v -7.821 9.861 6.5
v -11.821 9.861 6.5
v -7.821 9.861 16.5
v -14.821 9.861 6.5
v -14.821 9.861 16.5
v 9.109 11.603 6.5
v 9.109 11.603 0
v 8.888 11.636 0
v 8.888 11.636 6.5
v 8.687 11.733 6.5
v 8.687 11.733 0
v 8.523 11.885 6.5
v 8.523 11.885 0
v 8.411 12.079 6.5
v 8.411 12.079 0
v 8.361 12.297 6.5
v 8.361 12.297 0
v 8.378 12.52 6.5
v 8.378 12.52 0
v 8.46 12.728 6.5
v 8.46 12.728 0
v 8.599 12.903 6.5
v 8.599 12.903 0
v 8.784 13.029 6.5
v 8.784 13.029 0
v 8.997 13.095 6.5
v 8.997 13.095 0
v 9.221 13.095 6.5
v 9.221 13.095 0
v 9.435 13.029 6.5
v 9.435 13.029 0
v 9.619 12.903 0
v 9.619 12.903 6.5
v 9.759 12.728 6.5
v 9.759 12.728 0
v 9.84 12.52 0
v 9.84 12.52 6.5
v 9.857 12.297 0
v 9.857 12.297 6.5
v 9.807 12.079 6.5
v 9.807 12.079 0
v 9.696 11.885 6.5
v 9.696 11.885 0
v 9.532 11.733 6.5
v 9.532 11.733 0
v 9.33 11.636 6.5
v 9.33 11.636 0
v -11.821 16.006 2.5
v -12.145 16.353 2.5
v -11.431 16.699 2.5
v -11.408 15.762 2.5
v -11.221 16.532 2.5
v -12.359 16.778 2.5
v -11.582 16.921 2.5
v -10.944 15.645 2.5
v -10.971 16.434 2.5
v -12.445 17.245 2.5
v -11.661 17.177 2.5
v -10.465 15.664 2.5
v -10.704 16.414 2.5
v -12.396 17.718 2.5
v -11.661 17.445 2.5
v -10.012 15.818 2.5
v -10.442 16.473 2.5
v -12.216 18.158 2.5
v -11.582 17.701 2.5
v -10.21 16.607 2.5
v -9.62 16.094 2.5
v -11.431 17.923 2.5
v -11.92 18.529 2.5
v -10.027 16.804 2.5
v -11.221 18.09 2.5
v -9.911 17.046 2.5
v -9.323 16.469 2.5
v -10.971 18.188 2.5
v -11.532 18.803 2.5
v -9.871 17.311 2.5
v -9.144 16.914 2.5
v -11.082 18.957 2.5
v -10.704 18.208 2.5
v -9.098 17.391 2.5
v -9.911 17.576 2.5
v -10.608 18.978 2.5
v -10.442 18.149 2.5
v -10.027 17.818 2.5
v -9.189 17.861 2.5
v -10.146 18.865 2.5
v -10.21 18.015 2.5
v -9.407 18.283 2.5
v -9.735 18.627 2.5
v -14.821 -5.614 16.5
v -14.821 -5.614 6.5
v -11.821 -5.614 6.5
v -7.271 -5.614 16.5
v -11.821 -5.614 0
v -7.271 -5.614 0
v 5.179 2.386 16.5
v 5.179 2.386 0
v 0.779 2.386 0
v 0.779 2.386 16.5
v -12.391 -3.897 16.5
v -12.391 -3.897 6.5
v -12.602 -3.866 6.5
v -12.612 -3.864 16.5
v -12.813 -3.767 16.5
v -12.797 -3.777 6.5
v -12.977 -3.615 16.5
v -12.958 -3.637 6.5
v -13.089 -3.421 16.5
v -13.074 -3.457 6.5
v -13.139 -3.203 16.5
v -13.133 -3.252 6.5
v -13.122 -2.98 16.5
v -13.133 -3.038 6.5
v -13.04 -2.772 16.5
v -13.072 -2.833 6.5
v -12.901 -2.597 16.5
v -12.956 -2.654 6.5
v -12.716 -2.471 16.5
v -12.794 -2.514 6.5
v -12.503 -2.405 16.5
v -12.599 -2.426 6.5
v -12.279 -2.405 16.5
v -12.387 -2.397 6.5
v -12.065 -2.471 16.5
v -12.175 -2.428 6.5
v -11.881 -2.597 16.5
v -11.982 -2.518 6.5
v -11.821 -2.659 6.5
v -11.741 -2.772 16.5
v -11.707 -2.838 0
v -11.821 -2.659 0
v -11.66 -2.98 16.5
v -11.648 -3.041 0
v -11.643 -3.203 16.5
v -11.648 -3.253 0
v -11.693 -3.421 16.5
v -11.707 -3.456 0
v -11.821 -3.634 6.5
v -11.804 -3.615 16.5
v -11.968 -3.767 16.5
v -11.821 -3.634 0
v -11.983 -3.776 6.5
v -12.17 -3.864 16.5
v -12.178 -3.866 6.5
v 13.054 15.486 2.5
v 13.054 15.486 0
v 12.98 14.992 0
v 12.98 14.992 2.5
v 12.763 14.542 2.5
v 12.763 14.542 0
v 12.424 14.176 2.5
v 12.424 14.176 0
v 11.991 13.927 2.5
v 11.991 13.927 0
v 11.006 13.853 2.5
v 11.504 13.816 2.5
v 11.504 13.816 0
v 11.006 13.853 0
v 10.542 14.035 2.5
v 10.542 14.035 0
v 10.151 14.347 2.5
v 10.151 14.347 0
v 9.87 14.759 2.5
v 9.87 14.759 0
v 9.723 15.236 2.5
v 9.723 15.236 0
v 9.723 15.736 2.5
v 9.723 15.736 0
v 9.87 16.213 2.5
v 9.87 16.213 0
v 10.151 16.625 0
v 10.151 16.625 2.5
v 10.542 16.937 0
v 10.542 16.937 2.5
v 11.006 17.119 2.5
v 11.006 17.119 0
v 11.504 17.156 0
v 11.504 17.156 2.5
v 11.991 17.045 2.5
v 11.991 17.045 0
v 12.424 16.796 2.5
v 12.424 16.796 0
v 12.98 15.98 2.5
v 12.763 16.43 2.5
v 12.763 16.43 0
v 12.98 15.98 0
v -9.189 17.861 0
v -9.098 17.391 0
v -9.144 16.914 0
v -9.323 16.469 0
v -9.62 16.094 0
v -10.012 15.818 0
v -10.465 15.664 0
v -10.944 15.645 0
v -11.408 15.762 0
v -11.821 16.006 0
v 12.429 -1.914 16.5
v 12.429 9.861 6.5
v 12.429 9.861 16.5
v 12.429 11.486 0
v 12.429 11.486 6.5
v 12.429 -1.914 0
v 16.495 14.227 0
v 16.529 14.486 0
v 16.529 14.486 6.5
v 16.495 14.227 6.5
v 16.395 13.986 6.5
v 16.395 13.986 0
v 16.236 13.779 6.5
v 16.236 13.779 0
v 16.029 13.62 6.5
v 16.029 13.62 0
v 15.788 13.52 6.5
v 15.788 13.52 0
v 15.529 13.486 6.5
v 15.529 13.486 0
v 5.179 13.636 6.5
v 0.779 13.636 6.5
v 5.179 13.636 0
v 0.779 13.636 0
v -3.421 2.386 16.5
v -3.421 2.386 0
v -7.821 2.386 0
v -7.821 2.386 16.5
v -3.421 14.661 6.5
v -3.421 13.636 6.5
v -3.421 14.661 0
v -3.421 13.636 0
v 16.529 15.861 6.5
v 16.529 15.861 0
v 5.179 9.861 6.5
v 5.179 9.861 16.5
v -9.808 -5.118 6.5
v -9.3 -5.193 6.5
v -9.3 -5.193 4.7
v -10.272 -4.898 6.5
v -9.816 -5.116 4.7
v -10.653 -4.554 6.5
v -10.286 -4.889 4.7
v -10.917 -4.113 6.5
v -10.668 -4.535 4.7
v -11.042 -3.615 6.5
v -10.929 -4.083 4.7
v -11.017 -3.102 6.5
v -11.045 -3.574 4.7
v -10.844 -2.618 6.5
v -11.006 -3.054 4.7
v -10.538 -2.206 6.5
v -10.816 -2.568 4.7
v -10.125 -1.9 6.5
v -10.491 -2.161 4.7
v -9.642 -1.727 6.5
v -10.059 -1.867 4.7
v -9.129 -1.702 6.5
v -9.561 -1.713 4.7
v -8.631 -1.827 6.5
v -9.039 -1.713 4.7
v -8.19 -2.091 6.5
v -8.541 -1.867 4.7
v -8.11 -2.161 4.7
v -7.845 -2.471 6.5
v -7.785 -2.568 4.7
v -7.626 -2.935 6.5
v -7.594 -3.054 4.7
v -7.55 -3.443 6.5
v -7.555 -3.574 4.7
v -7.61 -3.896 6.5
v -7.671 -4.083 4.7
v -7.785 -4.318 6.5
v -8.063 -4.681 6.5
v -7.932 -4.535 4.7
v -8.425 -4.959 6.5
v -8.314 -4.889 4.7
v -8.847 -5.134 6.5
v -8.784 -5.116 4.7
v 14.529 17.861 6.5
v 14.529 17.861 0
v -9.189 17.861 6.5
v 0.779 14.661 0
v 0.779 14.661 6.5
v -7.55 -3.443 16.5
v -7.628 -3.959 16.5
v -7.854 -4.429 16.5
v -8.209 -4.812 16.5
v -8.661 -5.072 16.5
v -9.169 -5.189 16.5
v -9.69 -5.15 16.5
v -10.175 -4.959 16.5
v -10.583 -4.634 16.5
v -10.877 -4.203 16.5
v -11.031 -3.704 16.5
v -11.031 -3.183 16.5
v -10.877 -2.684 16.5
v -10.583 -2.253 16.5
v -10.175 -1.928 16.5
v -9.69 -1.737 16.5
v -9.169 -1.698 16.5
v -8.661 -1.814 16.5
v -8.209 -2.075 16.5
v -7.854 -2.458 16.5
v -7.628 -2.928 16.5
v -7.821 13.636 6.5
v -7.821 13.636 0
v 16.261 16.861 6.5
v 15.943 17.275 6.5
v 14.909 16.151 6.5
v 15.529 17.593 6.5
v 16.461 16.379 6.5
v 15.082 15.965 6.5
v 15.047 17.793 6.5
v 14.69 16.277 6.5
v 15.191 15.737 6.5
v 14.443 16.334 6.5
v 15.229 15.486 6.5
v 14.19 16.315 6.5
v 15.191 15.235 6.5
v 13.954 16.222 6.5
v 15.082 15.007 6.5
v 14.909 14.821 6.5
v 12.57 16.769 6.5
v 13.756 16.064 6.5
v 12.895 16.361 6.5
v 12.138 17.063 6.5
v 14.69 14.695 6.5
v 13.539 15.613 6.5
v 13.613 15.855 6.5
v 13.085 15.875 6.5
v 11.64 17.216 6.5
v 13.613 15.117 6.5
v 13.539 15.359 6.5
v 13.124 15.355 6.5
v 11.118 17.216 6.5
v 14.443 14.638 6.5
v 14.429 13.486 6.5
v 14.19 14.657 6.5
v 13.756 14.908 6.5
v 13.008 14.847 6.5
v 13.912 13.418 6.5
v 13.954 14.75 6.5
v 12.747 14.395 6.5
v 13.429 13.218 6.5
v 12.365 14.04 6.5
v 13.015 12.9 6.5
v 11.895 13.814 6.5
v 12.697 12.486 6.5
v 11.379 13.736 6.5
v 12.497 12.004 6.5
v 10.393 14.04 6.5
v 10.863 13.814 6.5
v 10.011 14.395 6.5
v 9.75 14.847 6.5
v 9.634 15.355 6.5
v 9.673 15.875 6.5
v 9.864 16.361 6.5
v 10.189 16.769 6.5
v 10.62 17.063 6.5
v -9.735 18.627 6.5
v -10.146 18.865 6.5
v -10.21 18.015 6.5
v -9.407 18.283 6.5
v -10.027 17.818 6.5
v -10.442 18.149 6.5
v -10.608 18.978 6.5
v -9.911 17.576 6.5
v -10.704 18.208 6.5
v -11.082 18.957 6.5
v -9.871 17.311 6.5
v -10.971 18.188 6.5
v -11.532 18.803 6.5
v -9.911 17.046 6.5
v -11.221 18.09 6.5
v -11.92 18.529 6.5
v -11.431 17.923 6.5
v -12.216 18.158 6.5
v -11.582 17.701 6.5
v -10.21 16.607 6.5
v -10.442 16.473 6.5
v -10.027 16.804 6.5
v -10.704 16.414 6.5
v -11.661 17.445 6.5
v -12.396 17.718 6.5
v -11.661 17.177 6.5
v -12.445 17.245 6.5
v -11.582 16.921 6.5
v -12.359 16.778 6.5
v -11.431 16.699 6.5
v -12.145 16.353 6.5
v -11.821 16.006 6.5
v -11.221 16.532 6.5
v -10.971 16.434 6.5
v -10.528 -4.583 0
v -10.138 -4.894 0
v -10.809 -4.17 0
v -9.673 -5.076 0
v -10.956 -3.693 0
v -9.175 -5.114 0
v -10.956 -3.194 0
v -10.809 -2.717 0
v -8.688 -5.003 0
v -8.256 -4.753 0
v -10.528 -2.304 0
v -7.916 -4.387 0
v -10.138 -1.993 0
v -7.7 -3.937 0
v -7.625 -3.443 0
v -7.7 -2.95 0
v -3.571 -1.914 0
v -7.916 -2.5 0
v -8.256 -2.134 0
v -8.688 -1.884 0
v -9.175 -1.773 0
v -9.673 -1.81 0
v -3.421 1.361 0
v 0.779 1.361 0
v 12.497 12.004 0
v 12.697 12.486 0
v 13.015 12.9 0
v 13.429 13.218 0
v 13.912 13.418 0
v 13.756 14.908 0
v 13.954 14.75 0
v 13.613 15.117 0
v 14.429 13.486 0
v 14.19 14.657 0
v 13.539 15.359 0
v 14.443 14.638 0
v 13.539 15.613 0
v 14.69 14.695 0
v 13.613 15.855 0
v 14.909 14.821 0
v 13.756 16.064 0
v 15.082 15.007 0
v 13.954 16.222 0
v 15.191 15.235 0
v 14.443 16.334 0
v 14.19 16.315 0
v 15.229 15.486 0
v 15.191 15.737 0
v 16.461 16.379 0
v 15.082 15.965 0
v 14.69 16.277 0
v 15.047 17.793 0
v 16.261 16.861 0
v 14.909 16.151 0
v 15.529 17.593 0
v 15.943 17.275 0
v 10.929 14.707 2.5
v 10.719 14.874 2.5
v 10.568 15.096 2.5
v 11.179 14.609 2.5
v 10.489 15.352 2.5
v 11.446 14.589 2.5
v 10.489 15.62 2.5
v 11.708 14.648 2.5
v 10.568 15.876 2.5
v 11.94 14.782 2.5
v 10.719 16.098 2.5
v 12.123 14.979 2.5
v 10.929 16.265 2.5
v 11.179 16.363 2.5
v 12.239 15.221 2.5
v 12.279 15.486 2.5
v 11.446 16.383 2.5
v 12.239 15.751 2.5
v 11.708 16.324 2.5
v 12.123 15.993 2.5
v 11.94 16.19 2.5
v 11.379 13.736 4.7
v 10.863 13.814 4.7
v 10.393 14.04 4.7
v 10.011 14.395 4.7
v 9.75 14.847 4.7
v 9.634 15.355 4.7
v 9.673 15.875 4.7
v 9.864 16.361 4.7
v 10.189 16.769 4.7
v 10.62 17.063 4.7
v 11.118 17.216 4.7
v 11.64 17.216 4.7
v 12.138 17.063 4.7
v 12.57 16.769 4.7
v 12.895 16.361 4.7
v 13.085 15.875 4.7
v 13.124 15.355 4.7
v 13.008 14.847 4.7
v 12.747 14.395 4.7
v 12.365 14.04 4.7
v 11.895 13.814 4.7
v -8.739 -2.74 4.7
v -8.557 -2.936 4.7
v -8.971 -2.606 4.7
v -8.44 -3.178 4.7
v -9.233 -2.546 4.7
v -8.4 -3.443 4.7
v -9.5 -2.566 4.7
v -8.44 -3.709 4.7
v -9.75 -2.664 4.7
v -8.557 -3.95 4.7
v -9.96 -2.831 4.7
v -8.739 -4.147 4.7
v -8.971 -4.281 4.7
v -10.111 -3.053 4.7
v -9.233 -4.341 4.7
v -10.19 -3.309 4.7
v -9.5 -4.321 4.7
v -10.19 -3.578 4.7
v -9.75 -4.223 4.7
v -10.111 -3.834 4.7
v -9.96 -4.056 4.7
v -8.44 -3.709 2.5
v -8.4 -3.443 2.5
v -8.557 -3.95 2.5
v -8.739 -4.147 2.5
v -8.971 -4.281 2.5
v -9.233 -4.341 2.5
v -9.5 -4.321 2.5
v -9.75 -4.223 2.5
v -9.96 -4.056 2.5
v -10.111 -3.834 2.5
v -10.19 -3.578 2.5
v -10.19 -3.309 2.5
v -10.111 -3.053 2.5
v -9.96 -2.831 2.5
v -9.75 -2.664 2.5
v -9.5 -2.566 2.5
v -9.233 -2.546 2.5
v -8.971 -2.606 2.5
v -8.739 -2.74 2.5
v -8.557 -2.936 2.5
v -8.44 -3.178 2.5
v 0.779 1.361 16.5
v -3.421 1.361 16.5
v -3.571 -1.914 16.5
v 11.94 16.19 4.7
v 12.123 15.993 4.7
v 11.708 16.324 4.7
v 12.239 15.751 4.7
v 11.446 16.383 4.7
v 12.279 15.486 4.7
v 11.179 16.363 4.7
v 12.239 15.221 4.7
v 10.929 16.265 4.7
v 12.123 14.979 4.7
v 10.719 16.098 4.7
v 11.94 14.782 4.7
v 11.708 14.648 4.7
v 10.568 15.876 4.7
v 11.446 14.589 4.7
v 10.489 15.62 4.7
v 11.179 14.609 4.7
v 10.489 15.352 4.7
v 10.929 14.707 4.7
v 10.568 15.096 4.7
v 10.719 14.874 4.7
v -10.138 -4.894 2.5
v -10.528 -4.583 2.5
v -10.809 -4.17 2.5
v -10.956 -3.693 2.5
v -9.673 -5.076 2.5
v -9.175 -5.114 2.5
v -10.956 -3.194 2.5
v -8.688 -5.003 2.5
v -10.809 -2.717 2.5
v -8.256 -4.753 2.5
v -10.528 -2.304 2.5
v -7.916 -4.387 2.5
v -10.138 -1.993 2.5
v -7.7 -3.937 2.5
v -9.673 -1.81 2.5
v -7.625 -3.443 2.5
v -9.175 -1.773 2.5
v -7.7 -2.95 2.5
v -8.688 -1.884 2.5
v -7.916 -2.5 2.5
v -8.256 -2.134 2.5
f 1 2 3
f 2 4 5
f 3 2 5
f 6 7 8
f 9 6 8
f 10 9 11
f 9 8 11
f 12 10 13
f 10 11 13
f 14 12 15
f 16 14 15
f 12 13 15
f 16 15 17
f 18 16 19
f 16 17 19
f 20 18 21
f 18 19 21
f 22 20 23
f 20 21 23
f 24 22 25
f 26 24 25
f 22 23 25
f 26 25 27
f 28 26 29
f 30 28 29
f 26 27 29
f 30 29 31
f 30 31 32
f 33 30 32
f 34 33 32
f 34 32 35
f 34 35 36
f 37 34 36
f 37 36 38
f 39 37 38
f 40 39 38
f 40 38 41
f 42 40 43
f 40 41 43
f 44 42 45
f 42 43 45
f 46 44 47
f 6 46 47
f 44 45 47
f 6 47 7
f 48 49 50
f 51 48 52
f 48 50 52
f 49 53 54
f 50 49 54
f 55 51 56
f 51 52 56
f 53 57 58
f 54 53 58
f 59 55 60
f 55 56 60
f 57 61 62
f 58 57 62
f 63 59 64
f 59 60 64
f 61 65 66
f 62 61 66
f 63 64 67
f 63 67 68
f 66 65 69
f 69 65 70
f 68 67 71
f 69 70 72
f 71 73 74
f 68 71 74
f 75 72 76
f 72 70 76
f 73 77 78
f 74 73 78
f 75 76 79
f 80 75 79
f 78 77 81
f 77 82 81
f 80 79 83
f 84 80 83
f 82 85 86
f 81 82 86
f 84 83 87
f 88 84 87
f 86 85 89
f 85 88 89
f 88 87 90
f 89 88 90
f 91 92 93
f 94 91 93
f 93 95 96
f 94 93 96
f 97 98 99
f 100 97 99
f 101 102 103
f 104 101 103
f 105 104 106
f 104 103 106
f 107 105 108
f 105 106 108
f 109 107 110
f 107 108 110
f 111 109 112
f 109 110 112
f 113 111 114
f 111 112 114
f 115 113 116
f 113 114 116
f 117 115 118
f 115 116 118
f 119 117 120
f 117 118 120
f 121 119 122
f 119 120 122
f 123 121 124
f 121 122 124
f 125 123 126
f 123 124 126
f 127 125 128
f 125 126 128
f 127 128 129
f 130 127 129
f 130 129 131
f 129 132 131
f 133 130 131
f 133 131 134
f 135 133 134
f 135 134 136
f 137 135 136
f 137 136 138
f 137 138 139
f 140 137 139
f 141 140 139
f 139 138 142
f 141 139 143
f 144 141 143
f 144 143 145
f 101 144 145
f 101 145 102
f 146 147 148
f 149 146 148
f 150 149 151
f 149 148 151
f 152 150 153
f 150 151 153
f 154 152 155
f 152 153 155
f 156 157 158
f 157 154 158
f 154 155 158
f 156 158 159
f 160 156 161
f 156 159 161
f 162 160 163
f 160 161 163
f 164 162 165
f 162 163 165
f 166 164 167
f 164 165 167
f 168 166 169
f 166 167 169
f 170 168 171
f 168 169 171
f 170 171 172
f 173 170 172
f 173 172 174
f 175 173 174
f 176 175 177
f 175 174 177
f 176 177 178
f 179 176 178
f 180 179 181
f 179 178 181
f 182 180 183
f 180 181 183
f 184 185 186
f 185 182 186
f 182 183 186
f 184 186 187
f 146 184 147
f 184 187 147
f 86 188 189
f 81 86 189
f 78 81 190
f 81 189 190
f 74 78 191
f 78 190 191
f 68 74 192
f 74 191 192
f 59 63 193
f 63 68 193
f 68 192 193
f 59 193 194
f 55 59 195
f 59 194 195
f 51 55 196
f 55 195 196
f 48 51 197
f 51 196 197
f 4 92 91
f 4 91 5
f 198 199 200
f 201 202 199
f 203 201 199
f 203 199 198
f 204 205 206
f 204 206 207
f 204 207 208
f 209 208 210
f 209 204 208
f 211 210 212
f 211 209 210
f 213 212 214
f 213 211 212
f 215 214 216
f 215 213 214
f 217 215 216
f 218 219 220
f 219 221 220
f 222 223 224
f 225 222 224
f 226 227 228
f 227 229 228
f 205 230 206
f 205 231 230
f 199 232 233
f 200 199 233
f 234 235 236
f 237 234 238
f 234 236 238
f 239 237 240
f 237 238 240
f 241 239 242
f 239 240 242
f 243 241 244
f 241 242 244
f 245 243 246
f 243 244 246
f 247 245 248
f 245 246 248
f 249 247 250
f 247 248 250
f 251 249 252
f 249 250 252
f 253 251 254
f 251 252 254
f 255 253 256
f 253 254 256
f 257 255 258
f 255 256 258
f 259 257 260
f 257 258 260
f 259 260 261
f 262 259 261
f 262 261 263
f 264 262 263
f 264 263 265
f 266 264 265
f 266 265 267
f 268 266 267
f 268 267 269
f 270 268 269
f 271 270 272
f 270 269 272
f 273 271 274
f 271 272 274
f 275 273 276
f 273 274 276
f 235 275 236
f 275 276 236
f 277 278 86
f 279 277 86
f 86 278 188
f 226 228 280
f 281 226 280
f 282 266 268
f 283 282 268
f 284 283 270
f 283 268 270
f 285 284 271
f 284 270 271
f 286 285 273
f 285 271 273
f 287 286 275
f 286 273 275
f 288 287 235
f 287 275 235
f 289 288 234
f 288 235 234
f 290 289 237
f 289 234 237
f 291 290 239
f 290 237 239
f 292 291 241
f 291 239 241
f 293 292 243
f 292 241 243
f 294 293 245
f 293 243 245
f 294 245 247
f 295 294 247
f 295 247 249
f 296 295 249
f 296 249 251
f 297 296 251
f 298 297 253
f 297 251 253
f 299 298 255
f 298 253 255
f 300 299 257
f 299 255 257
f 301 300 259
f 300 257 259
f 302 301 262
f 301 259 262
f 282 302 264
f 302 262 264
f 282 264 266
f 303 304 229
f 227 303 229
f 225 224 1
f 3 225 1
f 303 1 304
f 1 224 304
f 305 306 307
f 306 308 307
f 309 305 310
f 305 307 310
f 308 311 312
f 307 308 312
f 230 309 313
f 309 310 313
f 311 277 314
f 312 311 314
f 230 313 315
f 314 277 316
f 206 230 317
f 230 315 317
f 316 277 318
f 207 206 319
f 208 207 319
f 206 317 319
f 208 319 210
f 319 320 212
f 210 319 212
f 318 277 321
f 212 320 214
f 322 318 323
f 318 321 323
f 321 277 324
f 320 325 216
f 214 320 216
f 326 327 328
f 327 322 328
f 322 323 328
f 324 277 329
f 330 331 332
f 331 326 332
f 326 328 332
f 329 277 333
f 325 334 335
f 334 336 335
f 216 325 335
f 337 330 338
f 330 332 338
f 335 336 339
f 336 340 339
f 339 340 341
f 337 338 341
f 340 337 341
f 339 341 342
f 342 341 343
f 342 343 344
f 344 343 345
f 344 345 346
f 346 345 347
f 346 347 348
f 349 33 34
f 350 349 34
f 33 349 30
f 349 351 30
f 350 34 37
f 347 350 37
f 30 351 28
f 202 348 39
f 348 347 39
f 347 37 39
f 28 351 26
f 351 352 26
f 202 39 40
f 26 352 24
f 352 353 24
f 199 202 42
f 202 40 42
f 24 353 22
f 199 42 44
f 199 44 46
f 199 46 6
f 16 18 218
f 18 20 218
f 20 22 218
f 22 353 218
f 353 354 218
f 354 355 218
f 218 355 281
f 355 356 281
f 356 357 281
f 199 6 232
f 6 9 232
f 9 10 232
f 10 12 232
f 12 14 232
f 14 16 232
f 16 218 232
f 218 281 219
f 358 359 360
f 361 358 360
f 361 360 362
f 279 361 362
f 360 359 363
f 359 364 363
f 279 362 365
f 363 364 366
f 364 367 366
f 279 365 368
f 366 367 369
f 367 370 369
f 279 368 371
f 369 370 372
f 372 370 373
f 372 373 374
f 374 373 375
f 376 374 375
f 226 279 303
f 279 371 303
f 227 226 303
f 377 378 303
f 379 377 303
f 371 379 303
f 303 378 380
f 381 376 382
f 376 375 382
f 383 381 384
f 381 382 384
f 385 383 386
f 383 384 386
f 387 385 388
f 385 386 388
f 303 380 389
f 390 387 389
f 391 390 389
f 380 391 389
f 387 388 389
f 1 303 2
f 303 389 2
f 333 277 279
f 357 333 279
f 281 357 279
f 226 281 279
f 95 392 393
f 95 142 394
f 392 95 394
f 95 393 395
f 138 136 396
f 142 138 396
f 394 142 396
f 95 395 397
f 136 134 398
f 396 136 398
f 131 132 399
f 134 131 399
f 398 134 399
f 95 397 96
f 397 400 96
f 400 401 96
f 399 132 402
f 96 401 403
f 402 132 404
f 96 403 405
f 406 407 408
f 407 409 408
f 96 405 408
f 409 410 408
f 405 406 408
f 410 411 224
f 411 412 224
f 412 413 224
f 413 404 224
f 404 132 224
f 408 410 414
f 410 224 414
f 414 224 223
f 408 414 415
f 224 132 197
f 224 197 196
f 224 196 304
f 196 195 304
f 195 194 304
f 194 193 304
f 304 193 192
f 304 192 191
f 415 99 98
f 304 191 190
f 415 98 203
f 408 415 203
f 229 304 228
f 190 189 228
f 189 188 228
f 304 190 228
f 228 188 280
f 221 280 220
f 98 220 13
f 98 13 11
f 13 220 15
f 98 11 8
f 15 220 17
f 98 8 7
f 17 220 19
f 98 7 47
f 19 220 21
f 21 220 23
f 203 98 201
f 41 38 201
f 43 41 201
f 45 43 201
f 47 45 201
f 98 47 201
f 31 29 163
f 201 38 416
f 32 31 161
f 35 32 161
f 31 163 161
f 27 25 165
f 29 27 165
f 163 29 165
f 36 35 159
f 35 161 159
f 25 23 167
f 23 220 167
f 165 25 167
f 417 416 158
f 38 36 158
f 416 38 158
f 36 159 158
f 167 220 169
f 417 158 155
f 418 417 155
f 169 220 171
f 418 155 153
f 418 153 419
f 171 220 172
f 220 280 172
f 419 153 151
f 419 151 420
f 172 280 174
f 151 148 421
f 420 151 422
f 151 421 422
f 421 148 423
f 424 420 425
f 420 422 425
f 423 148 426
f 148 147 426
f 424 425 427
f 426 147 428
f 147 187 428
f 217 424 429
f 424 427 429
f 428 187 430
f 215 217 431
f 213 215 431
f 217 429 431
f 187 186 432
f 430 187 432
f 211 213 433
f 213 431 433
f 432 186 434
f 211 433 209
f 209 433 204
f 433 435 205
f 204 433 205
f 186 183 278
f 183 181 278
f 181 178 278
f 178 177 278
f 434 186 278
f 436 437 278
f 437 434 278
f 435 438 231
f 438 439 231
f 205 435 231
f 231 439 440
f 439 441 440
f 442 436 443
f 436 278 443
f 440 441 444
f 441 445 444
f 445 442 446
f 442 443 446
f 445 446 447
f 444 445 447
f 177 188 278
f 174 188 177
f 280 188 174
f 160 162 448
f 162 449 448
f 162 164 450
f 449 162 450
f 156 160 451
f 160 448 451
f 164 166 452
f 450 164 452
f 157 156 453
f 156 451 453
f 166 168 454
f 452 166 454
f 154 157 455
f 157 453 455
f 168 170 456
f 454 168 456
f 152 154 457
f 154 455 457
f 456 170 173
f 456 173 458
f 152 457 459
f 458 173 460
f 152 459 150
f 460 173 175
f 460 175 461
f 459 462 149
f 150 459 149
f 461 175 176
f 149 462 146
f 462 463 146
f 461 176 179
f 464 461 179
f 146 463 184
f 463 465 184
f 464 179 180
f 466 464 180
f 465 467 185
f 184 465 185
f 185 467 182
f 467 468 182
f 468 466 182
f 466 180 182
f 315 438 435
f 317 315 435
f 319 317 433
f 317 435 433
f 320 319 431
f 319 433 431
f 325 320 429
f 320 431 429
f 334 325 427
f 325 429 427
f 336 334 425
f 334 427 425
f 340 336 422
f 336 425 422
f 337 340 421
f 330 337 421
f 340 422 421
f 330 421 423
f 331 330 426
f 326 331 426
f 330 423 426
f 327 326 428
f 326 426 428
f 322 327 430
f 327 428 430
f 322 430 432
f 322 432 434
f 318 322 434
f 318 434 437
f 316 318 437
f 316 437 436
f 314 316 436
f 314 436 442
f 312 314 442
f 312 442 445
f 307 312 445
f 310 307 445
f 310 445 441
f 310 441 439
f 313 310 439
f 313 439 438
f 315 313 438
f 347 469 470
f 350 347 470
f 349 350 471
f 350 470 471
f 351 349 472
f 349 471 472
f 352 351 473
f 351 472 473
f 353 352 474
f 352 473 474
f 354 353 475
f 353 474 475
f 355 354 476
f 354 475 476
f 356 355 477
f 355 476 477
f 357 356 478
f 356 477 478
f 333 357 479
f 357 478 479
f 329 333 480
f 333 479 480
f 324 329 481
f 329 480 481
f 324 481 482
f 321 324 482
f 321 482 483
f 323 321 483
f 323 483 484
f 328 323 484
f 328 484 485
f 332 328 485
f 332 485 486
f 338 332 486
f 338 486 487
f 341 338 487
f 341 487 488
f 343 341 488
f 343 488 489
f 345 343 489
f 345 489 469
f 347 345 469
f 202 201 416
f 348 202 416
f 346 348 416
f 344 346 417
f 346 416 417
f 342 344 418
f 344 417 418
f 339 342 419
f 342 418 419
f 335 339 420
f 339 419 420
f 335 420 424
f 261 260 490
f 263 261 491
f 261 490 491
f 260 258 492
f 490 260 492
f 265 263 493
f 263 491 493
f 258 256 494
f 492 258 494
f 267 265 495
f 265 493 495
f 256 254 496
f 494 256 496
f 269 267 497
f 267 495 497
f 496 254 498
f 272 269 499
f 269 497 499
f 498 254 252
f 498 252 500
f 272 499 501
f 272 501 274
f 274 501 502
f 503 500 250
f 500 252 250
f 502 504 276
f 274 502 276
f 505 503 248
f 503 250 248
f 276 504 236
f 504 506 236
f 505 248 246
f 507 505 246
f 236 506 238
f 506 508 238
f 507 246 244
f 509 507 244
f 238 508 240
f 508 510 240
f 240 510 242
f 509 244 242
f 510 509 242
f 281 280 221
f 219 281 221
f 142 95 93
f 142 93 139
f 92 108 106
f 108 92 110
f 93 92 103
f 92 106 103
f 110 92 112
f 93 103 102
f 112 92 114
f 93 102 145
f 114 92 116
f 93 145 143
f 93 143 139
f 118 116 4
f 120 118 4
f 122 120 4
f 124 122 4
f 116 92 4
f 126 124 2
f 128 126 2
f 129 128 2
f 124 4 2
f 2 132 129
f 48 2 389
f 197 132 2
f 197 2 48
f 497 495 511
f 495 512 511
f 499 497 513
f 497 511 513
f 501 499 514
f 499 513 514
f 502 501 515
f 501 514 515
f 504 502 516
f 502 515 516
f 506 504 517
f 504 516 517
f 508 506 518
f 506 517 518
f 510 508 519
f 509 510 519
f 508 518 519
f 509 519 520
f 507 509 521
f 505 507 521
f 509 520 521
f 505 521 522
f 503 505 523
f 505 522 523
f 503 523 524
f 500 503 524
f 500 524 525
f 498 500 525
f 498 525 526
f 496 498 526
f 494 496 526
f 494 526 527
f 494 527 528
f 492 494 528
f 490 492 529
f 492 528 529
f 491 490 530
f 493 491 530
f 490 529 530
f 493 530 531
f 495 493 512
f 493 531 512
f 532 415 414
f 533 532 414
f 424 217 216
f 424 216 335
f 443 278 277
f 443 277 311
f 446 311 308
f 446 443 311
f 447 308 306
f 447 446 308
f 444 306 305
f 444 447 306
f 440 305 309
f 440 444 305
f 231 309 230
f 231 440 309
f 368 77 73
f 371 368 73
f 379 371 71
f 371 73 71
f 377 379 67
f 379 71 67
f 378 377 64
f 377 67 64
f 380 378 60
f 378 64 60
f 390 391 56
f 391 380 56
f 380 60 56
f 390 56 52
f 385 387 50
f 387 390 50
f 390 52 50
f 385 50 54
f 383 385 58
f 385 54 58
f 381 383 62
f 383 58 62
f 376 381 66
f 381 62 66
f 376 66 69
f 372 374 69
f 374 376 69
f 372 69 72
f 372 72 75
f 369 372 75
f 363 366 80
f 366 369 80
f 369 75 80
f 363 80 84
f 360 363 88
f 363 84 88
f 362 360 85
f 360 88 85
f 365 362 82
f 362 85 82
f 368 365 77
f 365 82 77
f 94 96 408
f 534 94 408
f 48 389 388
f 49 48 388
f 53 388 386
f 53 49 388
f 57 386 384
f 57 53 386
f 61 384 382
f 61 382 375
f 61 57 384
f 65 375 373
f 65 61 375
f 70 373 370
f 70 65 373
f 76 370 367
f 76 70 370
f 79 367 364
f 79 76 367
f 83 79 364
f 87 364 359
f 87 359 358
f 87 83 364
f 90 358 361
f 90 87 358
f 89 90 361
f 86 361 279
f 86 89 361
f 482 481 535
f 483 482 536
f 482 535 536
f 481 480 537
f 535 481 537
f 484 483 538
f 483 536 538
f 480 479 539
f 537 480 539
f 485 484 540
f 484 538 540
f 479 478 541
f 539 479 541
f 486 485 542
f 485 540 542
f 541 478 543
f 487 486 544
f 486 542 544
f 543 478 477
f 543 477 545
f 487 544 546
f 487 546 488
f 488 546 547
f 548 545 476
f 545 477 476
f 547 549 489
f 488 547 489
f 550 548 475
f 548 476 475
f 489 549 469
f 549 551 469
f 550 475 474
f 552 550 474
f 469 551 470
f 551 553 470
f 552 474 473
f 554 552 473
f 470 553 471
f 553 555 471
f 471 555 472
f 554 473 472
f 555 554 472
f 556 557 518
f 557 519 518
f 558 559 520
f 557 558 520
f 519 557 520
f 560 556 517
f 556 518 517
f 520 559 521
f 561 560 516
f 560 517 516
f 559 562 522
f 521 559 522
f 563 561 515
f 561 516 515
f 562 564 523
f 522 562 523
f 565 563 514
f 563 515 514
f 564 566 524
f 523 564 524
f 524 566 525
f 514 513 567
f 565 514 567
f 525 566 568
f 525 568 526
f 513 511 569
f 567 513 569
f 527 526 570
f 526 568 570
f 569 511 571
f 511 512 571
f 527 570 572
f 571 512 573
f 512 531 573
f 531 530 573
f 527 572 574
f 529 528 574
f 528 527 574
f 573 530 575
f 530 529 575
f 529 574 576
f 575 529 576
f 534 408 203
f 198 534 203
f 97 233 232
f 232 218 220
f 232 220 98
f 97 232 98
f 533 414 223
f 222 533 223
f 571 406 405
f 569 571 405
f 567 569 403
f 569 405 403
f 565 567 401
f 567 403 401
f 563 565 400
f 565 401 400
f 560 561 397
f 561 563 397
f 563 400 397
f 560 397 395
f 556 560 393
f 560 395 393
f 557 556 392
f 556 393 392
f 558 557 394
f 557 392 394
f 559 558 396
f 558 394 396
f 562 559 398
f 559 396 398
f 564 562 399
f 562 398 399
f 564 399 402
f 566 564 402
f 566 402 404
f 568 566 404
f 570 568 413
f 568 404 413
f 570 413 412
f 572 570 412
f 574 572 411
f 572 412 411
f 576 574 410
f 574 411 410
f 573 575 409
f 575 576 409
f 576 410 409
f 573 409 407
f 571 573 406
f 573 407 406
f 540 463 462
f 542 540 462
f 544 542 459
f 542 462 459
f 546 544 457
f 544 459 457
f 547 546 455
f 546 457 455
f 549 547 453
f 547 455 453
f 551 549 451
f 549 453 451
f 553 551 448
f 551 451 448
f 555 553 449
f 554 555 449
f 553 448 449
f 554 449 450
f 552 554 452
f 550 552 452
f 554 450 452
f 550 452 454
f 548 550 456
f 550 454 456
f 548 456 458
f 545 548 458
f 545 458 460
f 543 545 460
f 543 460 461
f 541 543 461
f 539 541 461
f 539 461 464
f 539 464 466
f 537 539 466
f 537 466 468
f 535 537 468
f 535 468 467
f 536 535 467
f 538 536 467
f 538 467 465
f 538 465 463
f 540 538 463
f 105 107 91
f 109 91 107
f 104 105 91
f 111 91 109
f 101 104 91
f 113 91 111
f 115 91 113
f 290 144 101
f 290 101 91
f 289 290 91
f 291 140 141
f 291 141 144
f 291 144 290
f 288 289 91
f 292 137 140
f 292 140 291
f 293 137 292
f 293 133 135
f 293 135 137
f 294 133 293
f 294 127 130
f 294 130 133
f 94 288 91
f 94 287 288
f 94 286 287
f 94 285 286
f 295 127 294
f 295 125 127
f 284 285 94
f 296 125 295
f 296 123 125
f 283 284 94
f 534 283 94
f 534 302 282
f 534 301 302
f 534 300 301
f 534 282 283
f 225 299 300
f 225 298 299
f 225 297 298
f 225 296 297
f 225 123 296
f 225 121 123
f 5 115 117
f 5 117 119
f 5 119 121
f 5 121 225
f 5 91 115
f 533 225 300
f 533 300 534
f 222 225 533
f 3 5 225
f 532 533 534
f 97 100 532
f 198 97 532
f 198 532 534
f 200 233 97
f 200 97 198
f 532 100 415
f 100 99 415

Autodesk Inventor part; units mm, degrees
ref_plane "YZ Plane" through (0, 0, 0) normal (1, 0, 0) x (0, 1, 0)
ref_plane "XZ Plane" through (0, 0, 0) normal (0, 1, 0) x (-1, 0, 0)
sketch "Skizze1" plane through (0, 0, 0) normal (0, 0, 1) x (1, 0, 0)
  line L0 (14.1792, -15.989) -> (14.1792, 19.011)
  line L1 (14.1792, 19.011) -> (-11.8208, 19.011)
  line L2 (-11.8208, 19.011) -> (-11.8208, -15.989)
  line L3 (-11.8208, -15.989) -> (14.1792, -15.989)
  line L4 (14.1792, -15.989) -> (-11.8208, 19.011) construction
  line L5 (14.1792, 19.011) -> (-11.8208, -15.989) construction
  line L6 (3.4292, 11.636) -> (-6.0708, 11.636) construction
  line L7 (3.4292, 4.386) -> (3.4292, 11.636) construction
  line L8 (-6.0708, 3.091) -> (3.4292, 3.091) construction
  line L9 (-6.0708, 11.636) -> (-6.0708, 4.386) construction
  line L10 (3.4292, 11.636) -> (-6.0708, 4.386) construction
  line L11 (3.4292, 4.386) -> (-6.0708, 11.636) construction
  point P0 (0, 0)
  point P1 (1.1792, 1.511)
  point P2 (1.1792, 1.511)
  point P3 (-1.3208, 8.011)
  point P4 (-1.3208, 8.011)
  point P5 (1.1792, 1.511)
  point P6 (-1.3208, 8.011)
  dimension "d0" = 26
  dimension "d1" = 35
  dimension "d2" = 11
  dimension "d3" = 2.5
sketch "Skizze2" plane through (0, 0, 0) normal (0, 0, 1) x (1, 0, 0)
  line L0 (-3.4208, 2.386) -> (-7.8208, 2.386) projected
  line L1 (-7.8208, 2.386) -> (-7.8208, 13.636) projected
  line L2 (-7.8208, 13.636) -> (-3.4208, 13.636) projected
  line L3 (5.1792, 2.386) -> (0.7792, 2.386) projected
  line L4 (5.1792, 13.636) -> (5.1792, 2.386) projected
  line L5 (0.7792, 13.636) -> (5.1792, 13.636) projected
  circle A0 centre (-9.3002, -3.4434) radius 1.575 construction
  circle A1 centre (11.3792, 15.486) radius 1.575 construction
  circle A2 centre (-9.3002, -3.4434) radius 0.7 construction
  circle A3 centre (-10.7708, 17.311) radius 0.7 construction
  circle A4 centre (11.3792, 15.486) radius 0.7 construction
  line L6 (-3.4208, 13.636) -> (-3.4208, 14.661) projected
  line L7 (-3.4208, 14.661) -> (0.7792, 14.661) projected
  line L8 (0.7792, 1.361) -> (-3.4208, 1.361) projected
  line L9 (-3.4208, 1.361) -> (-3.4208, 2.386) projected
  line L10 (0.7792, 2.386) -> (0.7792, 1.361) projected
  line L11 (0.7792, 14.661) -> (0.7792, 13.636) projected
  line L12 (-12.2708, -7.964) -> (-12.2708, 12.036) construction
  line L13 (14.5292, 17.861) -> (-9.295, 17.861) construction
  arc A5 (16.5292, 15.861) -> (14.5292, 17.861) centre (14.5292, 15.861) ccw projected
  line L14 (16.5292, 15.861) -> (16.5292, 14.486) projected
  arc A6 (15.5292, 13.486) -> (16.5292, 14.486) centre (15.5292, 14.486) ccw projected
  line L15 (15.5292, 13.486) -> (14.4292, 13.486) projected
  arc A7 (14.4292, 13.486) -> (12.4292, 11.486) centre (14.4292, 11.486) ccw projected
  line L16 (12.4292, 11.486) -> (12.4292, -1.914) projected
  line L17 (-3.5708, -1.914) -> (12.4292, -1.914) projected
  line L18 (-8.1002, -6.4434) -> (-3.5708, -1.914) projected
  arc A8 (-10.7708, 18.886) -> (-9.295, 17.861) centre (-10.7708, 17.311) ccw construction
  line L19 (-8.1002, -7.4434) -> (-8.1002, -6.4434) construction
  circle A9 centre (-9.3002, -7.4434) radius 0.75 construction
  circle A10 centre (-9.3002, -7.4434) radius 1.2 construction
  line L20 (-10.8208, -6.614) -> (-11.8208, -5.614) construction
  line L21 (-11.8208, -5.614) -> (-11.8208, 16.0059)
  line L22 (-11.8208, -5.614) -> (-10.4976, -6.9373)
  arc A11 (-8.1002, -6.9434) -> (-8.2864, -6.6296) centre (-9.3002, -7.4434) ccw construction
  line L23 (-8.1002, -6.9434) -> (-8.1002, -6.4434) construction
  circle A12 centre (-9.3002, -3.4434) radius 1.675
  circle A13 centre (11.3792, 15.486) radius 1.675
  line L24 (14.5292, 17.861) -> (-9.1887, 17.861)
  arc A14 (-11.8208, 16.0059) -> (-9.1887, 17.861) centre (-10.7708, 17.311) ccw
  circle A15 centre (14.3792, 15.486) radius 0.75 construction
  circle A16 centre (14.3792, 15.486) radius 0.85
  line L25 (-8.1002, -6.4434) -> (-8.2864, -6.6296) construction
  arc A17 (-8.2864, -6.6296) -> (-10.4976, -6.9373) centre (-9.3002, -7.4434) ccw construction
  line L26 (-11.8208, -5.614) -> (-7.2708, -5.614)
  point P0 (0, 0)
  dimension "d4" = 0.1
  dimension "d5" = 0.1
  dimension "d6" = 0.1
  dimension "d7" = 0.1
  dimension "d10" = 0.1
extrude "Extrusion1" add sketch "Skizze2" along normal blind 2.5
sketch "Skizze3" plane through (0, 0, 2.5) normal (0, 0, 1) x (1, 0, 0)
  circle A0 centre (11.3792, 15.486) radius 1.675 construction
  circle A1 centre (-9.3002, -3.4434) radius 1.675 construction
  circle A2 centre (14.3792, 15.486) radius 0.85 projected
  arc A3 (16.5292, 15.861) -> (14.5292, 17.861) centre (14.5292, 15.861) ccw projected
  line L0 (14.5292, 17.861) -> (-9.1887, 17.861) projected
  arc A4 (-11.8208, 16.0059) -> (-9.1887, 17.861) centre (-10.7708, 17.311) ccw construction
  line L1 (-11.8208, 16.0059) -> (-11.8208, -5.614) projected
  line L2 (-7.2708, -5.614) -> (-3.5708, -1.914) projected
  line L3 (-3.5708, -1.914) -> (12.4292, -1.914) projected
  line L4 (12.4292, -1.914) -> (12.4292, 11.486) projected
  arc A5 (14.4292, 13.486) -> (12.4292, 11.486) centre (14.4292, 11.486) ccw projected
  line L5 (14.4292, 13.486) -> (15.5292, 13.486) projected
  arc A6 (15.5292, 13.486) -> (16.5292, 14.486) centre (15.5292, 14.486) ccw projected
  line L6 (16.5292, 14.486) -> (16.5292, 15.861) projected
  circle A7 centre (11.3792, 15.486) radius 0.7 construction
  circle A8 centre (-9.3002, -3.4434) radius 0.7 construction
  circle A9 centre (-9.3002, -7.4434) radius 0.75 construction
  circle A10 centre (-9.3002, -7.4434) radius 0.85
  line L7 (-7.2708, -5.614) -> (-3.5708, -1.914) projected
  arc A11 (-10.3338, -7.0065) -> (-8.2864, -7.9246) centre (-9.3002, -7.4434) ccw
  arc A12 (-9.1887, 17.861) -> (-11.8208, 16.0059) centre (-10.7708, 17.311) ccw
  circle A13 centre (-10.7708, 17.311) radius 0.7 construction
  circle A14 centre (-10.7708, 17.311) radius 0.9
  circle A15 centre (11.3792, 15.486) radius 0.9
  circle A16 centre (-9.3002, -3.4434) radius 0.9
  line L8 (-11.8208, -5.614) -> (-7.2708, -5.614) projected
  line L9 (-7.8208, 2.386) -> (-7.8208, 13.636) projected
  line L10 (-7.8208, 13.636) -> (-3.4208, 13.636) projected
  line L11 (-3.4208, 13.636) -> (-3.4208, 14.661) projected
  line L12 (-3.4208, 14.661) -> (0.7792, 14.661) projected
  line L13 (0.7792, 14.661) -> (0.7792, 13.636) projected
  line L14 (0.7792, 13.636) -> (5.1792, 13.636) projected
  line L15 (5.1792, 13.636) -> (5.1792, 2.386) projected
  line L16 (5.1792, 2.386) -> (0.7792, 2.386) projected
  line L17 (0.7792, 2.386) -> (0.7792, 1.361) projected
  line L18 (0.7792, 1.361) -> (-3.4208, 1.361) projected
  line L19 (-3.4208, 1.361) -> (-3.4208, 2.386) projected
  line L20 (-3.4208, 2.386) -> (-7.8208, 2.386) projected
  circle A17 centre (11.3792, 15.486) radius 1.675 projected
  circle A18 centre (-9.3002, -3.4434) radius 1.675 projected
  circle A19 centre (14.3792, 15.486) radius 0.85 projected
  arc A20 (16.5292, 15.861) -> (14.5292, 17.861) centre (14.5292, 15.861) ccw projected
  line L21 (14.5292, 17.861) -> (-9.1887, 17.861) projected
  arc A21 (-11.8208, 16.0059) -> (-9.1887, 17.861) centre (-10.7708, 17.311) ccw projected
  line L22 (-11.8208, 16.0059) -> (-11.8208, -5.614) projected
  line L23 (-11.8208, -5.614) -> (-7.2708, -5.614) projected
  line L24 (-7.2708, -5.614) -> (-3.5708, -1.914) projected
  line L25 (-3.5708, -1.914) -> (12.4292, -1.914) projected
  line L26 (12.4292, -1.914) -> (12.4292, 11.486) projected
  arc A22 (14.4292, 13.486) -> (12.4292, 11.486) centre (14.4292, 11.486) ccw projected
  line L27 (14.4292, 13.486) -> (15.5292, 13.486) projected
  arc A23 (15.5292, 13.486) -> (16.5292, 14.486) centre (15.5292, 14.486) ccw projected
  line L28 (16.5292, 14.486) -> (16.5292, 15.861) projected
  point P0 (0, 0)
  dimension "d11" = 0.1
  dimension "d13" = 1.8
  dimension "d14" = 1.8
  dimension "d15" = 1.8
ref_plane "Arbeitsebene1" through (-9.7716, -9.2098, 6) normal (0, 0, 1) x (1, 0, 0)
extrude "Extrusion2" add sketch "Skizze3" along normal blind 4 contours L6 A6 L5 A5 L4 L3 L2 L8 L1 A21 L0 A3 | A21 A12 | A17 | A18
sketch "Skizze4" plane through (-9.1887, 16.566, 6.5) normal (0, 0, 1) x (1, 0, 0)
  circle A0 centre (-0.1115, -20.0094) radius 0.7 construction
  circle A1 centre (-1.5821, 0.745) radius 0.7 construction
  circle A2 centre (20.5679, -1.08) radius 0.7 construction
  point P0 (9.1887, -16.566)
hole "Bohrung1" at (-9.3002, -3.4434, 6.5) at (11.3792, 15.486, 6.5) direction (0, 0, -1) diameter 1.8 end through all counterbore diameter 3.5 counterbore depth 1.8 clearance for "Inbusschraube ISO 4762" size "M1.6" standard "ISO"
sketch "Sketch12" plane through (0, 0, 6.5) normal (0, 0, 1) x (1, 0, 0)
  circle A0 centre (-9.3002, -3.4434) radius 1.75 projected
  circle A1 centre (11.3792, 15.486) radius 1.75 projected
  line L0 (-7.8208, 13.636) -> (-3.4208, 13.636) projected
  line L1 (-3.4208, 13.636) -> (-3.4208, 14.661) projected
  line L2 (-3.4208, 14.661) -> (0.7792, 14.661) projected
  line L3 (0.7792, 14.661) -> (0.7792, 13.636) projected
  line L4 (0.7792, 13.636) -> (5.1792, 13.636) projected
  line L5 (5.1792, 13.636) -> (5.1792, 2.386) projected
  line L6 (5.1792, 2.386) -> (0.7792, 2.386) projected
  line L7 (0.7792, 2.386) -> (0.7792, 1.361) projected
  line L8 (0.7792, 1.361) -> (-3.4208, 1.361) projected
  line L9 (-3.4208, 1.361) -> (-3.4208, 2.386) projected
  line L10 (-3.4208, 2.386) -> (-7.8208, 2.386) projected
  line L11 (-7.8208, 2.386) -> (-7.8208, 13.636) projected
  circle A2 centre (14.3792, 15.486) radius 0.85 projected
  circle A3 centre (-10.7708, 17.311) radius 0.9 projected
  arc A4 (16.5292, 15.861) -> (14.5292, 17.861) centre (14.5292, 15.861) ccw projected
  line L12 (14.5292, 17.861) -> (-9.1887, 17.861) projected
  arc A5 (-9.1887, 17.861) -> (-11.8208, 16.0059) centre (-10.7708, 17.311) ccw projected
  line L13 (-11.8208, 16.0059) -> (-11.8208, -5.614) projected
  line L14 (-11.8208, -5.614) -> (-7.2708, -5.614) projected
  line L15 (-7.2708, -5.614) -> (-3.5708, -1.914) projected
  line L16 (-3.5708, -1.914) -> (12.4292, -1.914) projected
  line L17 (12.4292, -1.914) -> (12.4292, 11.486) projected
  arc A6 (14.4292, 13.486) -> (12.4292, 11.486) centre (14.4292, 11.486) ccw projected
  line L18 (14.4292, 13.486) -> (15.5292, 13.486) projected
  arc A7 (15.5292, 13.486) -> (16.5292, 14.486) centre (15.5292, 14.486) ccw projected
  line L19 (16.5292, 14.486) -> (16.5292, 15.861) projected
  line L20 (6.6092, 13.3531) -> (-8.8908, 13.3531) construction
  line L21 (-8.8908, 13.3531) -> (-8.8908, -0.1469) construction
  line L22 (-8.8908, -0.1469) -> (6.6092, -0.1469) construction
  line L23 (6.6092, -0.1469) -> (6.6092, 13.3531) construction
  circle A8 centre (-18.8908, 17.3531) radius 1 construction
  circle A9 centre (-12.3908, -3.1469) radius 1 construction
  circle A10 centre (9.1092, 12.3531) radius 1 construction
  arc A11 (-16.7463, 18.6788) -> (-17.7463, 19.6788) centre (-17.7463, 18.6788) ccw construction
  line L24 (-16.7463, 18.6788) -> (-16.7463, 15.9412) construction
  arc A12 (-16.7463, 15.9412) -> (-15.7463, 14.9412) centre (-15.7463, 15.9412) ccw construction
  line L25 (-15.7463, 14.9412) -> (10.3438, 14.9412) construction
  arc A13 (11.3438, 13.9412) -> (10.3438, 14.9412) centre (10.3438, 13.9412) ccw construction
  line L26 (11.3438, 13.9412) -> (11.3438, 11.3759) construction
  arc A14 (10.3438, 10.3759) -> (11.3438, 11.3759) centre (10.3438, 11.3759) ccw construction
  line L27 (10.3438, 10.3759) -> (10.1092, 10.3759) construction
  arc A15 (10.1092, 10.3759) -> (9.1092, 9.3759) centre (10.1092, 9.3759) ccw construction
  line L28 (9.1092, 9.3759) -> (9.1092, -2.1588) construction
  line L29 (9.1092, -2.1588) -> (-9.3631, -2.1588) construction
  arc A16 (-9.3631, -2.1588) -> (-10.3631, -3.1588) centre (-9.3631, -3.1588) ccw construction
  line L30 (-10.3631, -3.1588) -> (-10.3631, -5.0212) construction
  arc A17 (-11.3631, -6.0212) -> (-10.3631, -5.0212) centre (-11.3631, -5.0212) ccw construction
  line L31 (-11.3631, -6.0212) -> (-21.6562, -6.0212) construction
  line L32 (-21.6562, -6.0212) -> (-21.6562, 19.6788) construction
  line L33 (-21.6562, 19.6788) -> (-17.7463, 19.6788) construction
  line L34 (-7.2708, -5.614) -> (-11.8208, -5.614) construction
  line L35 (-11.8208, -5.614) -> (-14.8208, -5.614) construction
  line L36 (-14.8208, -5.614) -> (-14.8208, 15.9412) construction
  line L37 (-14.8208, 15.9412) -> (-11.8208, 15.9412) construction
  line L38 (-11.8208, 15.9412) -> (-11.8208, -5.614) construction
  line L39 (-11.8208, -5.614) -> (-14.8208, -5.614)
  line L40 (-14.8208, -5.614) -> (-14.8208, 15.9412)
  line L41 (-14.8208, 15.9412) -> (-11.8208, 15.9412)
  line L42 (-11.8208, 15.9412) -> (-11.8208, -5.614)
  point P0 (0, 0)
  dimension "d49" = 3
extrude "Extrusion9" add sketch "Sketch12" along normal blind 10
sketch "Sketch13" plane through (0, 0, 16.5) normal (0, 0, 1) x (1, 0, 0)
  line L0 (-5.5708, 25.836) -> (-16.7708, 25.836) construction
  arc A0 (-16.7463, 18.6788) -> (-17.7463, 19.6788) centre (-17.7463, 18.6788) ccw construction
  line L1 (-17.7463, 19.6788) -> (-21.6562, 19.6788) construction
  line L2 (-21.6562, 19.6788) -> (-21.6562, -6.0212) construction
  line L3 (-21.6562, -6.0212) -> (-11.3631, -6.0212) construction
  arc A1 (-11.3631, -6.0212) -> (-10.3631, -5.0212) centre (-11.3631, -5.0212) ccw construction
  line L4 (-10.3631, -5.0212) -> (-10.3631, -3.1588) construction
  arc A2 (-9.3631, -2.1588) -> (-10.3631, -3.1588) centre (-9.3631, -3.1588) ccw construction
  line L5 (-9.3631, -2.1588) -> (9.1092, -2.1588) construction
  line L6 (9.1092, -2.1588) -> (9.1092, 9.3759) construction
  arc A3 (10.1092, 10.3759) -> (9.1092, 9.3759) centre (10.1092, 9.3759) ccw construction
  line L7 (10.1092, 10.3759) -> (10.3438, 10.3759) construction
  arc A4 (10.3438, 10.3759) -> (11.3438, 11.3759) centre (10.3438, 11.3759) ccw construction
  line L8 (11.3438, 11.3759) -> (11.3438, 13.9412) construction
  arc A5 (11.3438, 13.9412) -> (10.3438, 14.9412) centre (10.3438, 13.9412) ccw construction
  line L9 (10.3438, 14.9412) -> (-15.7463, 14.9412) construction
  arc A6 (-16.7463, 15.9412) -> (-15.7463, 14.9412) centre (-15.7463, 15.9412) ccw construction
  line L10 (-16.7463, 15.9412) -> (-16.7463, 18.6788) construction
  line L11 (-8.8908, 13.3531) -> (6.6092, 13.3531) construction
  line L12 (6.6092, 13.3531) -> (6.6092, -0.1469) construction
  line L13 (6.6092, -0.1469) -> (-8.8908, -0.1469) construction
  line L14 (-8.8908, -0.1469) -> (-8.8908, 13.3531) construction
  circle A7 centre (-18.8908, 17.3531) radius 1 construction
  circle A8 centre (-12.3908, -3.1469) radius 1 construction
  circle A9 centre (9.1092, 12.3531) radius 1 construction
  point P0 (0, 0)
hole "Hole2" at (-12.3908, -3.1469, 16.5) at (9.1092, 12.3531, 16.5) direction (0, 0, -1) diameter 1.5 end through all
sketch "Sketch14" plane through (-14.8208, -5.614, 6.5) normal (-1, 0, 0) x (0, 0, 1)
  line L0 (0, 21.5553) -> (0, 2.9546) projected
  line L1 (19.819, 28.4609) -> (0, 28.4609)
  line L2 (0, 28.4609) -> (0, 15.475)
  line L3 (0, 15.475) -> (19.819, 15.475)
  line L4 (19.819, 15.475) -> (19.819, 28.4609)
  point P0 (-6.5, 5.614)
extrude "Extrusion10" cut sketch "Sketch14" against normal through all
properties part number "00_Adapter_Lens_PCB_XY_Translator"
